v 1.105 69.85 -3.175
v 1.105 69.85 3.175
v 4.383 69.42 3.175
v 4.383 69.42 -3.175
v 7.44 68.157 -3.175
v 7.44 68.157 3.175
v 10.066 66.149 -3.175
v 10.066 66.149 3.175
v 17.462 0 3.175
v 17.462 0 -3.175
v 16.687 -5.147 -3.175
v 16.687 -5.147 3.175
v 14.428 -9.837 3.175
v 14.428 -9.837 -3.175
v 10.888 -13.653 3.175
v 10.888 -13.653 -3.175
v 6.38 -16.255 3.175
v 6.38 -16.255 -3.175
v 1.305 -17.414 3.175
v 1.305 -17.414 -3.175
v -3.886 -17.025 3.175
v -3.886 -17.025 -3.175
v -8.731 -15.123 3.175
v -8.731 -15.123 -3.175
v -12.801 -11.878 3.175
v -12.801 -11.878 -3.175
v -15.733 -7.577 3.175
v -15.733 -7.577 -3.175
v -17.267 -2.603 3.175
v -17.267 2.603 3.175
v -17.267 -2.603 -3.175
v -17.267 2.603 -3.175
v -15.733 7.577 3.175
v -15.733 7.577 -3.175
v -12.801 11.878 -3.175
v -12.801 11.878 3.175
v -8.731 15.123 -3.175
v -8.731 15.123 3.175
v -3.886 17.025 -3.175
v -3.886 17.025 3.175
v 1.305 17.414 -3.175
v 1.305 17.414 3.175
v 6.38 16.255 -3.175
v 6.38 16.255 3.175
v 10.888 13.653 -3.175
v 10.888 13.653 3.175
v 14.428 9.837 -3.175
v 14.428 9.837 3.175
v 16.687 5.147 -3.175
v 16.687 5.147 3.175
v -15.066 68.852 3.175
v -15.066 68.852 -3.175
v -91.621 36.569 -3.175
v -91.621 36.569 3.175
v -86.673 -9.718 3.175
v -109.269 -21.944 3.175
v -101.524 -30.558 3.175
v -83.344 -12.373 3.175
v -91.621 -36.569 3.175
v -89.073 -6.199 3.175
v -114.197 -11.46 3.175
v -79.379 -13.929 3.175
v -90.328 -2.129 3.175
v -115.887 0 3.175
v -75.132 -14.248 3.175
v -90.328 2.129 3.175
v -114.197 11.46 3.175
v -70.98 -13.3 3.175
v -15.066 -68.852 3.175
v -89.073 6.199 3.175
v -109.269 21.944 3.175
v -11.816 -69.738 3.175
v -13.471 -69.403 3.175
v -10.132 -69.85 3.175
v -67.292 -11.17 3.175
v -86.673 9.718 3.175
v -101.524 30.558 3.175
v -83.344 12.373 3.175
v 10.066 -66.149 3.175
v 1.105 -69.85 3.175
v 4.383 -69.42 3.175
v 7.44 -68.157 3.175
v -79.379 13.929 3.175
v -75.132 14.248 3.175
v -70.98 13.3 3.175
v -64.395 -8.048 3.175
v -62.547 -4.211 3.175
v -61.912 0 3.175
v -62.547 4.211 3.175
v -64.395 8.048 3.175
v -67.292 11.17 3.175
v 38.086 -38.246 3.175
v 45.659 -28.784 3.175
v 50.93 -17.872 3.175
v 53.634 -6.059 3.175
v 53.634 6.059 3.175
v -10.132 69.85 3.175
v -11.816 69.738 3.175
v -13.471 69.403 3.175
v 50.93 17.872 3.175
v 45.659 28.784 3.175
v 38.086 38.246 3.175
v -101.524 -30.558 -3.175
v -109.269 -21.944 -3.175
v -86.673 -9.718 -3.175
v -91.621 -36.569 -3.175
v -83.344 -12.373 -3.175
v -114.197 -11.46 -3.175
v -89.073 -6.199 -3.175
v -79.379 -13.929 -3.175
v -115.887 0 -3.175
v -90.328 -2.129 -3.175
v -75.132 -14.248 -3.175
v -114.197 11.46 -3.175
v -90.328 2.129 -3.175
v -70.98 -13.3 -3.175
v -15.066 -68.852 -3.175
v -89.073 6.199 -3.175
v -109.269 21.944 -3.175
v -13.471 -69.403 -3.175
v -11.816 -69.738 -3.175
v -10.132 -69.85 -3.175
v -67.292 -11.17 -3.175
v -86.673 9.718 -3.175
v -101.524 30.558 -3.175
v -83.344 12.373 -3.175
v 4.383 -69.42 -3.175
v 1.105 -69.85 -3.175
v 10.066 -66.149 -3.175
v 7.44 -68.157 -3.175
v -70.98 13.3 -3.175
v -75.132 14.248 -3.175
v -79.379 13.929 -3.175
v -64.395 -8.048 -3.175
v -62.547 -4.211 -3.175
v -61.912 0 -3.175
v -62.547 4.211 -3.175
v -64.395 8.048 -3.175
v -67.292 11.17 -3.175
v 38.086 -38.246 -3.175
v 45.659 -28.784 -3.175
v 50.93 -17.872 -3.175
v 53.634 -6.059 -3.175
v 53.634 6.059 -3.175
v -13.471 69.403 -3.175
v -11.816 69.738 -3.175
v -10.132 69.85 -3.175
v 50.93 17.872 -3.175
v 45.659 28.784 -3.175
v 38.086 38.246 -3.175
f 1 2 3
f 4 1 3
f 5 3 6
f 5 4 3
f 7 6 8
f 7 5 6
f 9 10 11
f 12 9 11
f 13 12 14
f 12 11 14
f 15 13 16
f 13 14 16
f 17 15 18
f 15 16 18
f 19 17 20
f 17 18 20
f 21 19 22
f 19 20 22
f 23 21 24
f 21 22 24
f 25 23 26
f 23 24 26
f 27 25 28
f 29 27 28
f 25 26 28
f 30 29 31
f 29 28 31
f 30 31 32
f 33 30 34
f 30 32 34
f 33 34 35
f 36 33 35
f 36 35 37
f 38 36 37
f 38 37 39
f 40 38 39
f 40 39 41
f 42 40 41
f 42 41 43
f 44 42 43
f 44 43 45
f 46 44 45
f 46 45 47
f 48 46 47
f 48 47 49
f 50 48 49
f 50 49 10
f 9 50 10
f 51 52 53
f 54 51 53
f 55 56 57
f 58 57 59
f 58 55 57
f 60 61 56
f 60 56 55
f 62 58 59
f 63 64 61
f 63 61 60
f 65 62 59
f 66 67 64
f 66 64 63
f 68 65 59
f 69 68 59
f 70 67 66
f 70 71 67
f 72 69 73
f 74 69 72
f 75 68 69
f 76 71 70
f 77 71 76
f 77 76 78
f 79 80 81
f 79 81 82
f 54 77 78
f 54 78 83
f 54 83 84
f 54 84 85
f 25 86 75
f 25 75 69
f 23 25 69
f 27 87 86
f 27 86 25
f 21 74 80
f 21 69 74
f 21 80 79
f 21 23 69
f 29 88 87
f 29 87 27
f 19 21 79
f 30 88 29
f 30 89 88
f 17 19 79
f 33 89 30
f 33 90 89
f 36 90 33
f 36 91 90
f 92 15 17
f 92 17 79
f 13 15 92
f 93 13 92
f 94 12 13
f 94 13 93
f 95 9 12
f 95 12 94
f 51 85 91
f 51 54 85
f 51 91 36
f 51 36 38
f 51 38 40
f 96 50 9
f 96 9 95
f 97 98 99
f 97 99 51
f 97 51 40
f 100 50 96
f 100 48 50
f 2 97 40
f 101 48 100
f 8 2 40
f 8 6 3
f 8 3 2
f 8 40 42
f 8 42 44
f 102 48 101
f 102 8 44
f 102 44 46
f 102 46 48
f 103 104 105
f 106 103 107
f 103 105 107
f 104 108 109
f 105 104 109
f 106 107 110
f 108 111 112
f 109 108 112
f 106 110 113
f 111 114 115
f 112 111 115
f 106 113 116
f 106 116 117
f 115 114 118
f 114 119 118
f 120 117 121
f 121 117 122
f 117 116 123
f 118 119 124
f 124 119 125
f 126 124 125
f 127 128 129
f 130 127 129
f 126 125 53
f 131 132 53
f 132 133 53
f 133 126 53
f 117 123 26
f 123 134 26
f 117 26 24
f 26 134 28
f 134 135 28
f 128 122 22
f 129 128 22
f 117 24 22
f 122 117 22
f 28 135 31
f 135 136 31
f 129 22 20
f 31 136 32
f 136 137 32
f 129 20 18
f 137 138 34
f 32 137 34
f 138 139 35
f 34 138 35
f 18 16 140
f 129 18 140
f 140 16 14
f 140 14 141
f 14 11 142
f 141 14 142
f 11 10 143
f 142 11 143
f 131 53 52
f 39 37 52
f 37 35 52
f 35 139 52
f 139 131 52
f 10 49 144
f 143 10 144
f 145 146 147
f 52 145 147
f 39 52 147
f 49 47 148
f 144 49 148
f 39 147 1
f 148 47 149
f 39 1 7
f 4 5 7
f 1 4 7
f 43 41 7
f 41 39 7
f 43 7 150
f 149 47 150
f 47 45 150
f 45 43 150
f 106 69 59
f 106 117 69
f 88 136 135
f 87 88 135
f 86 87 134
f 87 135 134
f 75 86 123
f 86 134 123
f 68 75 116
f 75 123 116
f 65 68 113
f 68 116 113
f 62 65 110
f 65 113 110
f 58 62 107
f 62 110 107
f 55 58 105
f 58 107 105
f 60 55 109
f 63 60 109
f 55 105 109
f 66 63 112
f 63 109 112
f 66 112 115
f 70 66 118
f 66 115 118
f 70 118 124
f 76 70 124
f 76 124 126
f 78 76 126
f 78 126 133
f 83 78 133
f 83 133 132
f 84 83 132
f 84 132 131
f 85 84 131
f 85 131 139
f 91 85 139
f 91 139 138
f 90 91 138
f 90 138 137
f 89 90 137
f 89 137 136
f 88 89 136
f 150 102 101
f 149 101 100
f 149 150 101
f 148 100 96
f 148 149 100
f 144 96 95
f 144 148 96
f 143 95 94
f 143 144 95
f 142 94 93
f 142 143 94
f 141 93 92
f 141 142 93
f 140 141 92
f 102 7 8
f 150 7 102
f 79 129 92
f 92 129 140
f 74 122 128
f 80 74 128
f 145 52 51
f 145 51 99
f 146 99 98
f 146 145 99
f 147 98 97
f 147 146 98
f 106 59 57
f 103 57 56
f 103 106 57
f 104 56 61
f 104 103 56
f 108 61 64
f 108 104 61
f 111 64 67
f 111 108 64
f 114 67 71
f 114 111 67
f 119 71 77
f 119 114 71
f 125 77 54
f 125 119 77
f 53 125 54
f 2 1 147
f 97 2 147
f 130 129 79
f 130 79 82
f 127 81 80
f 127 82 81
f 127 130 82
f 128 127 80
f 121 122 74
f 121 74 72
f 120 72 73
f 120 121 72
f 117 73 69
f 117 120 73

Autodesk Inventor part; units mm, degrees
ref_plane "YZ Plane" through (0, 0, 0) normal (1, 0, 0) x (0, 1, 0)
ref_plane "XZ Plane" through (0, 0, 0) normal (0, 1, 0) x (-1, 0, 0)
ref_plane "XY Plane" through (0, 0, 0) normal (0, 0, 1) x (1, 0, 0)
sketch "Sketch1" plane through (0, 0, 0) normal (0, 0, 1) x (1, 0, 0)
  line L0 (-149.86, 0) -> (87.9475, 0) projected
  line L1 (0, -137.1561) -> (0, 141.8112) projected
  line L2 (11.7901, -97.3036) -> (11.7901, 101.9587) construction
  circle A0 centre (0, 0) radius 50.8 construction
  circle A1 centre (0, 0) radius 17.4625
  line L3 (1.105, 69.85) -> (-10.1317, 69.85)
  line L4 (10.0665, 66.149) -> (38.0865, 38.2455)
  line L5 (-10.1317, -69.85) -> (1.105, -69.85)
  line L6 (10.0665, -66.149) -> (38.0865, -38.2455)
  arc A2 (38.0865, -38.2455) -> (38.0865, 38.2455) centre (0, 0) ccw
  circle A3 centre (-76.2, 0) radius 14.2875
  arc A4 (-91.6211, 36.5689) -> (-91.6211, -36.5689) centre (-76.2, 0) ccw
  line L7 (-15.0665, 68.8521) -> (-91.6211, 36.5689)
  line L8 (-15.0665, -68.8521) -> (-91.6211, -36.5689)
  line L9 (-63.5889, 6.715) -> (-63.5889, -6.715) construction
  arc A5 (-10.1317, 69.85) -> (-15.0665, 68.8521) centre (-10.1317, 57.15) ccw
  arc A6 (10.0665, 66.149) -> (1.105, 69.85) centre (1.105, 57.15) ccw
  arc A7 (1.105, -69.85) -> (10.0665, -66.149) centre (1.105, -57.15) ccw
  arc A8 (-15.0665, -68.8521) -> (-10.1317, -69.85) centre (-10.1317, -57.15) ccw
  point P0 (11.7901, -97.3036)
  point P1 (11.7901, 101.9587)
  point P2 (46.1798, 0)
  point P3 (6.35, 69.85)
  point P4 (-12.7, 69.85)
  point P5 (6.35, -69.85)
  dimension "d9" = 101.6
  dimension "d10" = 34.925
  dimension "d12" = 69.85
  dimension "d15" = 19.05
  dimension "d16" = 3.175
  dimension "d19" = 28.575
  dimension "d20" = 25.4
  dimension "d22" = 6.35
  dimension "d23" = 6.35
  dimension "d24" = 12.7
  dimension "d25" = 76.2
extrude "Extrusion1" add sketch "Sketch1" along normal mid plane 6.35 contours A4 L7 A5 L3 L1 A1 L0 A3 | L0 A3 A1 L1 L5 A8 L8 A4 | L1 L3 A6 L4 A2 L0 A1 | A1 L0 A2 L6 A7 L5 L1
properties part number "full plate"
